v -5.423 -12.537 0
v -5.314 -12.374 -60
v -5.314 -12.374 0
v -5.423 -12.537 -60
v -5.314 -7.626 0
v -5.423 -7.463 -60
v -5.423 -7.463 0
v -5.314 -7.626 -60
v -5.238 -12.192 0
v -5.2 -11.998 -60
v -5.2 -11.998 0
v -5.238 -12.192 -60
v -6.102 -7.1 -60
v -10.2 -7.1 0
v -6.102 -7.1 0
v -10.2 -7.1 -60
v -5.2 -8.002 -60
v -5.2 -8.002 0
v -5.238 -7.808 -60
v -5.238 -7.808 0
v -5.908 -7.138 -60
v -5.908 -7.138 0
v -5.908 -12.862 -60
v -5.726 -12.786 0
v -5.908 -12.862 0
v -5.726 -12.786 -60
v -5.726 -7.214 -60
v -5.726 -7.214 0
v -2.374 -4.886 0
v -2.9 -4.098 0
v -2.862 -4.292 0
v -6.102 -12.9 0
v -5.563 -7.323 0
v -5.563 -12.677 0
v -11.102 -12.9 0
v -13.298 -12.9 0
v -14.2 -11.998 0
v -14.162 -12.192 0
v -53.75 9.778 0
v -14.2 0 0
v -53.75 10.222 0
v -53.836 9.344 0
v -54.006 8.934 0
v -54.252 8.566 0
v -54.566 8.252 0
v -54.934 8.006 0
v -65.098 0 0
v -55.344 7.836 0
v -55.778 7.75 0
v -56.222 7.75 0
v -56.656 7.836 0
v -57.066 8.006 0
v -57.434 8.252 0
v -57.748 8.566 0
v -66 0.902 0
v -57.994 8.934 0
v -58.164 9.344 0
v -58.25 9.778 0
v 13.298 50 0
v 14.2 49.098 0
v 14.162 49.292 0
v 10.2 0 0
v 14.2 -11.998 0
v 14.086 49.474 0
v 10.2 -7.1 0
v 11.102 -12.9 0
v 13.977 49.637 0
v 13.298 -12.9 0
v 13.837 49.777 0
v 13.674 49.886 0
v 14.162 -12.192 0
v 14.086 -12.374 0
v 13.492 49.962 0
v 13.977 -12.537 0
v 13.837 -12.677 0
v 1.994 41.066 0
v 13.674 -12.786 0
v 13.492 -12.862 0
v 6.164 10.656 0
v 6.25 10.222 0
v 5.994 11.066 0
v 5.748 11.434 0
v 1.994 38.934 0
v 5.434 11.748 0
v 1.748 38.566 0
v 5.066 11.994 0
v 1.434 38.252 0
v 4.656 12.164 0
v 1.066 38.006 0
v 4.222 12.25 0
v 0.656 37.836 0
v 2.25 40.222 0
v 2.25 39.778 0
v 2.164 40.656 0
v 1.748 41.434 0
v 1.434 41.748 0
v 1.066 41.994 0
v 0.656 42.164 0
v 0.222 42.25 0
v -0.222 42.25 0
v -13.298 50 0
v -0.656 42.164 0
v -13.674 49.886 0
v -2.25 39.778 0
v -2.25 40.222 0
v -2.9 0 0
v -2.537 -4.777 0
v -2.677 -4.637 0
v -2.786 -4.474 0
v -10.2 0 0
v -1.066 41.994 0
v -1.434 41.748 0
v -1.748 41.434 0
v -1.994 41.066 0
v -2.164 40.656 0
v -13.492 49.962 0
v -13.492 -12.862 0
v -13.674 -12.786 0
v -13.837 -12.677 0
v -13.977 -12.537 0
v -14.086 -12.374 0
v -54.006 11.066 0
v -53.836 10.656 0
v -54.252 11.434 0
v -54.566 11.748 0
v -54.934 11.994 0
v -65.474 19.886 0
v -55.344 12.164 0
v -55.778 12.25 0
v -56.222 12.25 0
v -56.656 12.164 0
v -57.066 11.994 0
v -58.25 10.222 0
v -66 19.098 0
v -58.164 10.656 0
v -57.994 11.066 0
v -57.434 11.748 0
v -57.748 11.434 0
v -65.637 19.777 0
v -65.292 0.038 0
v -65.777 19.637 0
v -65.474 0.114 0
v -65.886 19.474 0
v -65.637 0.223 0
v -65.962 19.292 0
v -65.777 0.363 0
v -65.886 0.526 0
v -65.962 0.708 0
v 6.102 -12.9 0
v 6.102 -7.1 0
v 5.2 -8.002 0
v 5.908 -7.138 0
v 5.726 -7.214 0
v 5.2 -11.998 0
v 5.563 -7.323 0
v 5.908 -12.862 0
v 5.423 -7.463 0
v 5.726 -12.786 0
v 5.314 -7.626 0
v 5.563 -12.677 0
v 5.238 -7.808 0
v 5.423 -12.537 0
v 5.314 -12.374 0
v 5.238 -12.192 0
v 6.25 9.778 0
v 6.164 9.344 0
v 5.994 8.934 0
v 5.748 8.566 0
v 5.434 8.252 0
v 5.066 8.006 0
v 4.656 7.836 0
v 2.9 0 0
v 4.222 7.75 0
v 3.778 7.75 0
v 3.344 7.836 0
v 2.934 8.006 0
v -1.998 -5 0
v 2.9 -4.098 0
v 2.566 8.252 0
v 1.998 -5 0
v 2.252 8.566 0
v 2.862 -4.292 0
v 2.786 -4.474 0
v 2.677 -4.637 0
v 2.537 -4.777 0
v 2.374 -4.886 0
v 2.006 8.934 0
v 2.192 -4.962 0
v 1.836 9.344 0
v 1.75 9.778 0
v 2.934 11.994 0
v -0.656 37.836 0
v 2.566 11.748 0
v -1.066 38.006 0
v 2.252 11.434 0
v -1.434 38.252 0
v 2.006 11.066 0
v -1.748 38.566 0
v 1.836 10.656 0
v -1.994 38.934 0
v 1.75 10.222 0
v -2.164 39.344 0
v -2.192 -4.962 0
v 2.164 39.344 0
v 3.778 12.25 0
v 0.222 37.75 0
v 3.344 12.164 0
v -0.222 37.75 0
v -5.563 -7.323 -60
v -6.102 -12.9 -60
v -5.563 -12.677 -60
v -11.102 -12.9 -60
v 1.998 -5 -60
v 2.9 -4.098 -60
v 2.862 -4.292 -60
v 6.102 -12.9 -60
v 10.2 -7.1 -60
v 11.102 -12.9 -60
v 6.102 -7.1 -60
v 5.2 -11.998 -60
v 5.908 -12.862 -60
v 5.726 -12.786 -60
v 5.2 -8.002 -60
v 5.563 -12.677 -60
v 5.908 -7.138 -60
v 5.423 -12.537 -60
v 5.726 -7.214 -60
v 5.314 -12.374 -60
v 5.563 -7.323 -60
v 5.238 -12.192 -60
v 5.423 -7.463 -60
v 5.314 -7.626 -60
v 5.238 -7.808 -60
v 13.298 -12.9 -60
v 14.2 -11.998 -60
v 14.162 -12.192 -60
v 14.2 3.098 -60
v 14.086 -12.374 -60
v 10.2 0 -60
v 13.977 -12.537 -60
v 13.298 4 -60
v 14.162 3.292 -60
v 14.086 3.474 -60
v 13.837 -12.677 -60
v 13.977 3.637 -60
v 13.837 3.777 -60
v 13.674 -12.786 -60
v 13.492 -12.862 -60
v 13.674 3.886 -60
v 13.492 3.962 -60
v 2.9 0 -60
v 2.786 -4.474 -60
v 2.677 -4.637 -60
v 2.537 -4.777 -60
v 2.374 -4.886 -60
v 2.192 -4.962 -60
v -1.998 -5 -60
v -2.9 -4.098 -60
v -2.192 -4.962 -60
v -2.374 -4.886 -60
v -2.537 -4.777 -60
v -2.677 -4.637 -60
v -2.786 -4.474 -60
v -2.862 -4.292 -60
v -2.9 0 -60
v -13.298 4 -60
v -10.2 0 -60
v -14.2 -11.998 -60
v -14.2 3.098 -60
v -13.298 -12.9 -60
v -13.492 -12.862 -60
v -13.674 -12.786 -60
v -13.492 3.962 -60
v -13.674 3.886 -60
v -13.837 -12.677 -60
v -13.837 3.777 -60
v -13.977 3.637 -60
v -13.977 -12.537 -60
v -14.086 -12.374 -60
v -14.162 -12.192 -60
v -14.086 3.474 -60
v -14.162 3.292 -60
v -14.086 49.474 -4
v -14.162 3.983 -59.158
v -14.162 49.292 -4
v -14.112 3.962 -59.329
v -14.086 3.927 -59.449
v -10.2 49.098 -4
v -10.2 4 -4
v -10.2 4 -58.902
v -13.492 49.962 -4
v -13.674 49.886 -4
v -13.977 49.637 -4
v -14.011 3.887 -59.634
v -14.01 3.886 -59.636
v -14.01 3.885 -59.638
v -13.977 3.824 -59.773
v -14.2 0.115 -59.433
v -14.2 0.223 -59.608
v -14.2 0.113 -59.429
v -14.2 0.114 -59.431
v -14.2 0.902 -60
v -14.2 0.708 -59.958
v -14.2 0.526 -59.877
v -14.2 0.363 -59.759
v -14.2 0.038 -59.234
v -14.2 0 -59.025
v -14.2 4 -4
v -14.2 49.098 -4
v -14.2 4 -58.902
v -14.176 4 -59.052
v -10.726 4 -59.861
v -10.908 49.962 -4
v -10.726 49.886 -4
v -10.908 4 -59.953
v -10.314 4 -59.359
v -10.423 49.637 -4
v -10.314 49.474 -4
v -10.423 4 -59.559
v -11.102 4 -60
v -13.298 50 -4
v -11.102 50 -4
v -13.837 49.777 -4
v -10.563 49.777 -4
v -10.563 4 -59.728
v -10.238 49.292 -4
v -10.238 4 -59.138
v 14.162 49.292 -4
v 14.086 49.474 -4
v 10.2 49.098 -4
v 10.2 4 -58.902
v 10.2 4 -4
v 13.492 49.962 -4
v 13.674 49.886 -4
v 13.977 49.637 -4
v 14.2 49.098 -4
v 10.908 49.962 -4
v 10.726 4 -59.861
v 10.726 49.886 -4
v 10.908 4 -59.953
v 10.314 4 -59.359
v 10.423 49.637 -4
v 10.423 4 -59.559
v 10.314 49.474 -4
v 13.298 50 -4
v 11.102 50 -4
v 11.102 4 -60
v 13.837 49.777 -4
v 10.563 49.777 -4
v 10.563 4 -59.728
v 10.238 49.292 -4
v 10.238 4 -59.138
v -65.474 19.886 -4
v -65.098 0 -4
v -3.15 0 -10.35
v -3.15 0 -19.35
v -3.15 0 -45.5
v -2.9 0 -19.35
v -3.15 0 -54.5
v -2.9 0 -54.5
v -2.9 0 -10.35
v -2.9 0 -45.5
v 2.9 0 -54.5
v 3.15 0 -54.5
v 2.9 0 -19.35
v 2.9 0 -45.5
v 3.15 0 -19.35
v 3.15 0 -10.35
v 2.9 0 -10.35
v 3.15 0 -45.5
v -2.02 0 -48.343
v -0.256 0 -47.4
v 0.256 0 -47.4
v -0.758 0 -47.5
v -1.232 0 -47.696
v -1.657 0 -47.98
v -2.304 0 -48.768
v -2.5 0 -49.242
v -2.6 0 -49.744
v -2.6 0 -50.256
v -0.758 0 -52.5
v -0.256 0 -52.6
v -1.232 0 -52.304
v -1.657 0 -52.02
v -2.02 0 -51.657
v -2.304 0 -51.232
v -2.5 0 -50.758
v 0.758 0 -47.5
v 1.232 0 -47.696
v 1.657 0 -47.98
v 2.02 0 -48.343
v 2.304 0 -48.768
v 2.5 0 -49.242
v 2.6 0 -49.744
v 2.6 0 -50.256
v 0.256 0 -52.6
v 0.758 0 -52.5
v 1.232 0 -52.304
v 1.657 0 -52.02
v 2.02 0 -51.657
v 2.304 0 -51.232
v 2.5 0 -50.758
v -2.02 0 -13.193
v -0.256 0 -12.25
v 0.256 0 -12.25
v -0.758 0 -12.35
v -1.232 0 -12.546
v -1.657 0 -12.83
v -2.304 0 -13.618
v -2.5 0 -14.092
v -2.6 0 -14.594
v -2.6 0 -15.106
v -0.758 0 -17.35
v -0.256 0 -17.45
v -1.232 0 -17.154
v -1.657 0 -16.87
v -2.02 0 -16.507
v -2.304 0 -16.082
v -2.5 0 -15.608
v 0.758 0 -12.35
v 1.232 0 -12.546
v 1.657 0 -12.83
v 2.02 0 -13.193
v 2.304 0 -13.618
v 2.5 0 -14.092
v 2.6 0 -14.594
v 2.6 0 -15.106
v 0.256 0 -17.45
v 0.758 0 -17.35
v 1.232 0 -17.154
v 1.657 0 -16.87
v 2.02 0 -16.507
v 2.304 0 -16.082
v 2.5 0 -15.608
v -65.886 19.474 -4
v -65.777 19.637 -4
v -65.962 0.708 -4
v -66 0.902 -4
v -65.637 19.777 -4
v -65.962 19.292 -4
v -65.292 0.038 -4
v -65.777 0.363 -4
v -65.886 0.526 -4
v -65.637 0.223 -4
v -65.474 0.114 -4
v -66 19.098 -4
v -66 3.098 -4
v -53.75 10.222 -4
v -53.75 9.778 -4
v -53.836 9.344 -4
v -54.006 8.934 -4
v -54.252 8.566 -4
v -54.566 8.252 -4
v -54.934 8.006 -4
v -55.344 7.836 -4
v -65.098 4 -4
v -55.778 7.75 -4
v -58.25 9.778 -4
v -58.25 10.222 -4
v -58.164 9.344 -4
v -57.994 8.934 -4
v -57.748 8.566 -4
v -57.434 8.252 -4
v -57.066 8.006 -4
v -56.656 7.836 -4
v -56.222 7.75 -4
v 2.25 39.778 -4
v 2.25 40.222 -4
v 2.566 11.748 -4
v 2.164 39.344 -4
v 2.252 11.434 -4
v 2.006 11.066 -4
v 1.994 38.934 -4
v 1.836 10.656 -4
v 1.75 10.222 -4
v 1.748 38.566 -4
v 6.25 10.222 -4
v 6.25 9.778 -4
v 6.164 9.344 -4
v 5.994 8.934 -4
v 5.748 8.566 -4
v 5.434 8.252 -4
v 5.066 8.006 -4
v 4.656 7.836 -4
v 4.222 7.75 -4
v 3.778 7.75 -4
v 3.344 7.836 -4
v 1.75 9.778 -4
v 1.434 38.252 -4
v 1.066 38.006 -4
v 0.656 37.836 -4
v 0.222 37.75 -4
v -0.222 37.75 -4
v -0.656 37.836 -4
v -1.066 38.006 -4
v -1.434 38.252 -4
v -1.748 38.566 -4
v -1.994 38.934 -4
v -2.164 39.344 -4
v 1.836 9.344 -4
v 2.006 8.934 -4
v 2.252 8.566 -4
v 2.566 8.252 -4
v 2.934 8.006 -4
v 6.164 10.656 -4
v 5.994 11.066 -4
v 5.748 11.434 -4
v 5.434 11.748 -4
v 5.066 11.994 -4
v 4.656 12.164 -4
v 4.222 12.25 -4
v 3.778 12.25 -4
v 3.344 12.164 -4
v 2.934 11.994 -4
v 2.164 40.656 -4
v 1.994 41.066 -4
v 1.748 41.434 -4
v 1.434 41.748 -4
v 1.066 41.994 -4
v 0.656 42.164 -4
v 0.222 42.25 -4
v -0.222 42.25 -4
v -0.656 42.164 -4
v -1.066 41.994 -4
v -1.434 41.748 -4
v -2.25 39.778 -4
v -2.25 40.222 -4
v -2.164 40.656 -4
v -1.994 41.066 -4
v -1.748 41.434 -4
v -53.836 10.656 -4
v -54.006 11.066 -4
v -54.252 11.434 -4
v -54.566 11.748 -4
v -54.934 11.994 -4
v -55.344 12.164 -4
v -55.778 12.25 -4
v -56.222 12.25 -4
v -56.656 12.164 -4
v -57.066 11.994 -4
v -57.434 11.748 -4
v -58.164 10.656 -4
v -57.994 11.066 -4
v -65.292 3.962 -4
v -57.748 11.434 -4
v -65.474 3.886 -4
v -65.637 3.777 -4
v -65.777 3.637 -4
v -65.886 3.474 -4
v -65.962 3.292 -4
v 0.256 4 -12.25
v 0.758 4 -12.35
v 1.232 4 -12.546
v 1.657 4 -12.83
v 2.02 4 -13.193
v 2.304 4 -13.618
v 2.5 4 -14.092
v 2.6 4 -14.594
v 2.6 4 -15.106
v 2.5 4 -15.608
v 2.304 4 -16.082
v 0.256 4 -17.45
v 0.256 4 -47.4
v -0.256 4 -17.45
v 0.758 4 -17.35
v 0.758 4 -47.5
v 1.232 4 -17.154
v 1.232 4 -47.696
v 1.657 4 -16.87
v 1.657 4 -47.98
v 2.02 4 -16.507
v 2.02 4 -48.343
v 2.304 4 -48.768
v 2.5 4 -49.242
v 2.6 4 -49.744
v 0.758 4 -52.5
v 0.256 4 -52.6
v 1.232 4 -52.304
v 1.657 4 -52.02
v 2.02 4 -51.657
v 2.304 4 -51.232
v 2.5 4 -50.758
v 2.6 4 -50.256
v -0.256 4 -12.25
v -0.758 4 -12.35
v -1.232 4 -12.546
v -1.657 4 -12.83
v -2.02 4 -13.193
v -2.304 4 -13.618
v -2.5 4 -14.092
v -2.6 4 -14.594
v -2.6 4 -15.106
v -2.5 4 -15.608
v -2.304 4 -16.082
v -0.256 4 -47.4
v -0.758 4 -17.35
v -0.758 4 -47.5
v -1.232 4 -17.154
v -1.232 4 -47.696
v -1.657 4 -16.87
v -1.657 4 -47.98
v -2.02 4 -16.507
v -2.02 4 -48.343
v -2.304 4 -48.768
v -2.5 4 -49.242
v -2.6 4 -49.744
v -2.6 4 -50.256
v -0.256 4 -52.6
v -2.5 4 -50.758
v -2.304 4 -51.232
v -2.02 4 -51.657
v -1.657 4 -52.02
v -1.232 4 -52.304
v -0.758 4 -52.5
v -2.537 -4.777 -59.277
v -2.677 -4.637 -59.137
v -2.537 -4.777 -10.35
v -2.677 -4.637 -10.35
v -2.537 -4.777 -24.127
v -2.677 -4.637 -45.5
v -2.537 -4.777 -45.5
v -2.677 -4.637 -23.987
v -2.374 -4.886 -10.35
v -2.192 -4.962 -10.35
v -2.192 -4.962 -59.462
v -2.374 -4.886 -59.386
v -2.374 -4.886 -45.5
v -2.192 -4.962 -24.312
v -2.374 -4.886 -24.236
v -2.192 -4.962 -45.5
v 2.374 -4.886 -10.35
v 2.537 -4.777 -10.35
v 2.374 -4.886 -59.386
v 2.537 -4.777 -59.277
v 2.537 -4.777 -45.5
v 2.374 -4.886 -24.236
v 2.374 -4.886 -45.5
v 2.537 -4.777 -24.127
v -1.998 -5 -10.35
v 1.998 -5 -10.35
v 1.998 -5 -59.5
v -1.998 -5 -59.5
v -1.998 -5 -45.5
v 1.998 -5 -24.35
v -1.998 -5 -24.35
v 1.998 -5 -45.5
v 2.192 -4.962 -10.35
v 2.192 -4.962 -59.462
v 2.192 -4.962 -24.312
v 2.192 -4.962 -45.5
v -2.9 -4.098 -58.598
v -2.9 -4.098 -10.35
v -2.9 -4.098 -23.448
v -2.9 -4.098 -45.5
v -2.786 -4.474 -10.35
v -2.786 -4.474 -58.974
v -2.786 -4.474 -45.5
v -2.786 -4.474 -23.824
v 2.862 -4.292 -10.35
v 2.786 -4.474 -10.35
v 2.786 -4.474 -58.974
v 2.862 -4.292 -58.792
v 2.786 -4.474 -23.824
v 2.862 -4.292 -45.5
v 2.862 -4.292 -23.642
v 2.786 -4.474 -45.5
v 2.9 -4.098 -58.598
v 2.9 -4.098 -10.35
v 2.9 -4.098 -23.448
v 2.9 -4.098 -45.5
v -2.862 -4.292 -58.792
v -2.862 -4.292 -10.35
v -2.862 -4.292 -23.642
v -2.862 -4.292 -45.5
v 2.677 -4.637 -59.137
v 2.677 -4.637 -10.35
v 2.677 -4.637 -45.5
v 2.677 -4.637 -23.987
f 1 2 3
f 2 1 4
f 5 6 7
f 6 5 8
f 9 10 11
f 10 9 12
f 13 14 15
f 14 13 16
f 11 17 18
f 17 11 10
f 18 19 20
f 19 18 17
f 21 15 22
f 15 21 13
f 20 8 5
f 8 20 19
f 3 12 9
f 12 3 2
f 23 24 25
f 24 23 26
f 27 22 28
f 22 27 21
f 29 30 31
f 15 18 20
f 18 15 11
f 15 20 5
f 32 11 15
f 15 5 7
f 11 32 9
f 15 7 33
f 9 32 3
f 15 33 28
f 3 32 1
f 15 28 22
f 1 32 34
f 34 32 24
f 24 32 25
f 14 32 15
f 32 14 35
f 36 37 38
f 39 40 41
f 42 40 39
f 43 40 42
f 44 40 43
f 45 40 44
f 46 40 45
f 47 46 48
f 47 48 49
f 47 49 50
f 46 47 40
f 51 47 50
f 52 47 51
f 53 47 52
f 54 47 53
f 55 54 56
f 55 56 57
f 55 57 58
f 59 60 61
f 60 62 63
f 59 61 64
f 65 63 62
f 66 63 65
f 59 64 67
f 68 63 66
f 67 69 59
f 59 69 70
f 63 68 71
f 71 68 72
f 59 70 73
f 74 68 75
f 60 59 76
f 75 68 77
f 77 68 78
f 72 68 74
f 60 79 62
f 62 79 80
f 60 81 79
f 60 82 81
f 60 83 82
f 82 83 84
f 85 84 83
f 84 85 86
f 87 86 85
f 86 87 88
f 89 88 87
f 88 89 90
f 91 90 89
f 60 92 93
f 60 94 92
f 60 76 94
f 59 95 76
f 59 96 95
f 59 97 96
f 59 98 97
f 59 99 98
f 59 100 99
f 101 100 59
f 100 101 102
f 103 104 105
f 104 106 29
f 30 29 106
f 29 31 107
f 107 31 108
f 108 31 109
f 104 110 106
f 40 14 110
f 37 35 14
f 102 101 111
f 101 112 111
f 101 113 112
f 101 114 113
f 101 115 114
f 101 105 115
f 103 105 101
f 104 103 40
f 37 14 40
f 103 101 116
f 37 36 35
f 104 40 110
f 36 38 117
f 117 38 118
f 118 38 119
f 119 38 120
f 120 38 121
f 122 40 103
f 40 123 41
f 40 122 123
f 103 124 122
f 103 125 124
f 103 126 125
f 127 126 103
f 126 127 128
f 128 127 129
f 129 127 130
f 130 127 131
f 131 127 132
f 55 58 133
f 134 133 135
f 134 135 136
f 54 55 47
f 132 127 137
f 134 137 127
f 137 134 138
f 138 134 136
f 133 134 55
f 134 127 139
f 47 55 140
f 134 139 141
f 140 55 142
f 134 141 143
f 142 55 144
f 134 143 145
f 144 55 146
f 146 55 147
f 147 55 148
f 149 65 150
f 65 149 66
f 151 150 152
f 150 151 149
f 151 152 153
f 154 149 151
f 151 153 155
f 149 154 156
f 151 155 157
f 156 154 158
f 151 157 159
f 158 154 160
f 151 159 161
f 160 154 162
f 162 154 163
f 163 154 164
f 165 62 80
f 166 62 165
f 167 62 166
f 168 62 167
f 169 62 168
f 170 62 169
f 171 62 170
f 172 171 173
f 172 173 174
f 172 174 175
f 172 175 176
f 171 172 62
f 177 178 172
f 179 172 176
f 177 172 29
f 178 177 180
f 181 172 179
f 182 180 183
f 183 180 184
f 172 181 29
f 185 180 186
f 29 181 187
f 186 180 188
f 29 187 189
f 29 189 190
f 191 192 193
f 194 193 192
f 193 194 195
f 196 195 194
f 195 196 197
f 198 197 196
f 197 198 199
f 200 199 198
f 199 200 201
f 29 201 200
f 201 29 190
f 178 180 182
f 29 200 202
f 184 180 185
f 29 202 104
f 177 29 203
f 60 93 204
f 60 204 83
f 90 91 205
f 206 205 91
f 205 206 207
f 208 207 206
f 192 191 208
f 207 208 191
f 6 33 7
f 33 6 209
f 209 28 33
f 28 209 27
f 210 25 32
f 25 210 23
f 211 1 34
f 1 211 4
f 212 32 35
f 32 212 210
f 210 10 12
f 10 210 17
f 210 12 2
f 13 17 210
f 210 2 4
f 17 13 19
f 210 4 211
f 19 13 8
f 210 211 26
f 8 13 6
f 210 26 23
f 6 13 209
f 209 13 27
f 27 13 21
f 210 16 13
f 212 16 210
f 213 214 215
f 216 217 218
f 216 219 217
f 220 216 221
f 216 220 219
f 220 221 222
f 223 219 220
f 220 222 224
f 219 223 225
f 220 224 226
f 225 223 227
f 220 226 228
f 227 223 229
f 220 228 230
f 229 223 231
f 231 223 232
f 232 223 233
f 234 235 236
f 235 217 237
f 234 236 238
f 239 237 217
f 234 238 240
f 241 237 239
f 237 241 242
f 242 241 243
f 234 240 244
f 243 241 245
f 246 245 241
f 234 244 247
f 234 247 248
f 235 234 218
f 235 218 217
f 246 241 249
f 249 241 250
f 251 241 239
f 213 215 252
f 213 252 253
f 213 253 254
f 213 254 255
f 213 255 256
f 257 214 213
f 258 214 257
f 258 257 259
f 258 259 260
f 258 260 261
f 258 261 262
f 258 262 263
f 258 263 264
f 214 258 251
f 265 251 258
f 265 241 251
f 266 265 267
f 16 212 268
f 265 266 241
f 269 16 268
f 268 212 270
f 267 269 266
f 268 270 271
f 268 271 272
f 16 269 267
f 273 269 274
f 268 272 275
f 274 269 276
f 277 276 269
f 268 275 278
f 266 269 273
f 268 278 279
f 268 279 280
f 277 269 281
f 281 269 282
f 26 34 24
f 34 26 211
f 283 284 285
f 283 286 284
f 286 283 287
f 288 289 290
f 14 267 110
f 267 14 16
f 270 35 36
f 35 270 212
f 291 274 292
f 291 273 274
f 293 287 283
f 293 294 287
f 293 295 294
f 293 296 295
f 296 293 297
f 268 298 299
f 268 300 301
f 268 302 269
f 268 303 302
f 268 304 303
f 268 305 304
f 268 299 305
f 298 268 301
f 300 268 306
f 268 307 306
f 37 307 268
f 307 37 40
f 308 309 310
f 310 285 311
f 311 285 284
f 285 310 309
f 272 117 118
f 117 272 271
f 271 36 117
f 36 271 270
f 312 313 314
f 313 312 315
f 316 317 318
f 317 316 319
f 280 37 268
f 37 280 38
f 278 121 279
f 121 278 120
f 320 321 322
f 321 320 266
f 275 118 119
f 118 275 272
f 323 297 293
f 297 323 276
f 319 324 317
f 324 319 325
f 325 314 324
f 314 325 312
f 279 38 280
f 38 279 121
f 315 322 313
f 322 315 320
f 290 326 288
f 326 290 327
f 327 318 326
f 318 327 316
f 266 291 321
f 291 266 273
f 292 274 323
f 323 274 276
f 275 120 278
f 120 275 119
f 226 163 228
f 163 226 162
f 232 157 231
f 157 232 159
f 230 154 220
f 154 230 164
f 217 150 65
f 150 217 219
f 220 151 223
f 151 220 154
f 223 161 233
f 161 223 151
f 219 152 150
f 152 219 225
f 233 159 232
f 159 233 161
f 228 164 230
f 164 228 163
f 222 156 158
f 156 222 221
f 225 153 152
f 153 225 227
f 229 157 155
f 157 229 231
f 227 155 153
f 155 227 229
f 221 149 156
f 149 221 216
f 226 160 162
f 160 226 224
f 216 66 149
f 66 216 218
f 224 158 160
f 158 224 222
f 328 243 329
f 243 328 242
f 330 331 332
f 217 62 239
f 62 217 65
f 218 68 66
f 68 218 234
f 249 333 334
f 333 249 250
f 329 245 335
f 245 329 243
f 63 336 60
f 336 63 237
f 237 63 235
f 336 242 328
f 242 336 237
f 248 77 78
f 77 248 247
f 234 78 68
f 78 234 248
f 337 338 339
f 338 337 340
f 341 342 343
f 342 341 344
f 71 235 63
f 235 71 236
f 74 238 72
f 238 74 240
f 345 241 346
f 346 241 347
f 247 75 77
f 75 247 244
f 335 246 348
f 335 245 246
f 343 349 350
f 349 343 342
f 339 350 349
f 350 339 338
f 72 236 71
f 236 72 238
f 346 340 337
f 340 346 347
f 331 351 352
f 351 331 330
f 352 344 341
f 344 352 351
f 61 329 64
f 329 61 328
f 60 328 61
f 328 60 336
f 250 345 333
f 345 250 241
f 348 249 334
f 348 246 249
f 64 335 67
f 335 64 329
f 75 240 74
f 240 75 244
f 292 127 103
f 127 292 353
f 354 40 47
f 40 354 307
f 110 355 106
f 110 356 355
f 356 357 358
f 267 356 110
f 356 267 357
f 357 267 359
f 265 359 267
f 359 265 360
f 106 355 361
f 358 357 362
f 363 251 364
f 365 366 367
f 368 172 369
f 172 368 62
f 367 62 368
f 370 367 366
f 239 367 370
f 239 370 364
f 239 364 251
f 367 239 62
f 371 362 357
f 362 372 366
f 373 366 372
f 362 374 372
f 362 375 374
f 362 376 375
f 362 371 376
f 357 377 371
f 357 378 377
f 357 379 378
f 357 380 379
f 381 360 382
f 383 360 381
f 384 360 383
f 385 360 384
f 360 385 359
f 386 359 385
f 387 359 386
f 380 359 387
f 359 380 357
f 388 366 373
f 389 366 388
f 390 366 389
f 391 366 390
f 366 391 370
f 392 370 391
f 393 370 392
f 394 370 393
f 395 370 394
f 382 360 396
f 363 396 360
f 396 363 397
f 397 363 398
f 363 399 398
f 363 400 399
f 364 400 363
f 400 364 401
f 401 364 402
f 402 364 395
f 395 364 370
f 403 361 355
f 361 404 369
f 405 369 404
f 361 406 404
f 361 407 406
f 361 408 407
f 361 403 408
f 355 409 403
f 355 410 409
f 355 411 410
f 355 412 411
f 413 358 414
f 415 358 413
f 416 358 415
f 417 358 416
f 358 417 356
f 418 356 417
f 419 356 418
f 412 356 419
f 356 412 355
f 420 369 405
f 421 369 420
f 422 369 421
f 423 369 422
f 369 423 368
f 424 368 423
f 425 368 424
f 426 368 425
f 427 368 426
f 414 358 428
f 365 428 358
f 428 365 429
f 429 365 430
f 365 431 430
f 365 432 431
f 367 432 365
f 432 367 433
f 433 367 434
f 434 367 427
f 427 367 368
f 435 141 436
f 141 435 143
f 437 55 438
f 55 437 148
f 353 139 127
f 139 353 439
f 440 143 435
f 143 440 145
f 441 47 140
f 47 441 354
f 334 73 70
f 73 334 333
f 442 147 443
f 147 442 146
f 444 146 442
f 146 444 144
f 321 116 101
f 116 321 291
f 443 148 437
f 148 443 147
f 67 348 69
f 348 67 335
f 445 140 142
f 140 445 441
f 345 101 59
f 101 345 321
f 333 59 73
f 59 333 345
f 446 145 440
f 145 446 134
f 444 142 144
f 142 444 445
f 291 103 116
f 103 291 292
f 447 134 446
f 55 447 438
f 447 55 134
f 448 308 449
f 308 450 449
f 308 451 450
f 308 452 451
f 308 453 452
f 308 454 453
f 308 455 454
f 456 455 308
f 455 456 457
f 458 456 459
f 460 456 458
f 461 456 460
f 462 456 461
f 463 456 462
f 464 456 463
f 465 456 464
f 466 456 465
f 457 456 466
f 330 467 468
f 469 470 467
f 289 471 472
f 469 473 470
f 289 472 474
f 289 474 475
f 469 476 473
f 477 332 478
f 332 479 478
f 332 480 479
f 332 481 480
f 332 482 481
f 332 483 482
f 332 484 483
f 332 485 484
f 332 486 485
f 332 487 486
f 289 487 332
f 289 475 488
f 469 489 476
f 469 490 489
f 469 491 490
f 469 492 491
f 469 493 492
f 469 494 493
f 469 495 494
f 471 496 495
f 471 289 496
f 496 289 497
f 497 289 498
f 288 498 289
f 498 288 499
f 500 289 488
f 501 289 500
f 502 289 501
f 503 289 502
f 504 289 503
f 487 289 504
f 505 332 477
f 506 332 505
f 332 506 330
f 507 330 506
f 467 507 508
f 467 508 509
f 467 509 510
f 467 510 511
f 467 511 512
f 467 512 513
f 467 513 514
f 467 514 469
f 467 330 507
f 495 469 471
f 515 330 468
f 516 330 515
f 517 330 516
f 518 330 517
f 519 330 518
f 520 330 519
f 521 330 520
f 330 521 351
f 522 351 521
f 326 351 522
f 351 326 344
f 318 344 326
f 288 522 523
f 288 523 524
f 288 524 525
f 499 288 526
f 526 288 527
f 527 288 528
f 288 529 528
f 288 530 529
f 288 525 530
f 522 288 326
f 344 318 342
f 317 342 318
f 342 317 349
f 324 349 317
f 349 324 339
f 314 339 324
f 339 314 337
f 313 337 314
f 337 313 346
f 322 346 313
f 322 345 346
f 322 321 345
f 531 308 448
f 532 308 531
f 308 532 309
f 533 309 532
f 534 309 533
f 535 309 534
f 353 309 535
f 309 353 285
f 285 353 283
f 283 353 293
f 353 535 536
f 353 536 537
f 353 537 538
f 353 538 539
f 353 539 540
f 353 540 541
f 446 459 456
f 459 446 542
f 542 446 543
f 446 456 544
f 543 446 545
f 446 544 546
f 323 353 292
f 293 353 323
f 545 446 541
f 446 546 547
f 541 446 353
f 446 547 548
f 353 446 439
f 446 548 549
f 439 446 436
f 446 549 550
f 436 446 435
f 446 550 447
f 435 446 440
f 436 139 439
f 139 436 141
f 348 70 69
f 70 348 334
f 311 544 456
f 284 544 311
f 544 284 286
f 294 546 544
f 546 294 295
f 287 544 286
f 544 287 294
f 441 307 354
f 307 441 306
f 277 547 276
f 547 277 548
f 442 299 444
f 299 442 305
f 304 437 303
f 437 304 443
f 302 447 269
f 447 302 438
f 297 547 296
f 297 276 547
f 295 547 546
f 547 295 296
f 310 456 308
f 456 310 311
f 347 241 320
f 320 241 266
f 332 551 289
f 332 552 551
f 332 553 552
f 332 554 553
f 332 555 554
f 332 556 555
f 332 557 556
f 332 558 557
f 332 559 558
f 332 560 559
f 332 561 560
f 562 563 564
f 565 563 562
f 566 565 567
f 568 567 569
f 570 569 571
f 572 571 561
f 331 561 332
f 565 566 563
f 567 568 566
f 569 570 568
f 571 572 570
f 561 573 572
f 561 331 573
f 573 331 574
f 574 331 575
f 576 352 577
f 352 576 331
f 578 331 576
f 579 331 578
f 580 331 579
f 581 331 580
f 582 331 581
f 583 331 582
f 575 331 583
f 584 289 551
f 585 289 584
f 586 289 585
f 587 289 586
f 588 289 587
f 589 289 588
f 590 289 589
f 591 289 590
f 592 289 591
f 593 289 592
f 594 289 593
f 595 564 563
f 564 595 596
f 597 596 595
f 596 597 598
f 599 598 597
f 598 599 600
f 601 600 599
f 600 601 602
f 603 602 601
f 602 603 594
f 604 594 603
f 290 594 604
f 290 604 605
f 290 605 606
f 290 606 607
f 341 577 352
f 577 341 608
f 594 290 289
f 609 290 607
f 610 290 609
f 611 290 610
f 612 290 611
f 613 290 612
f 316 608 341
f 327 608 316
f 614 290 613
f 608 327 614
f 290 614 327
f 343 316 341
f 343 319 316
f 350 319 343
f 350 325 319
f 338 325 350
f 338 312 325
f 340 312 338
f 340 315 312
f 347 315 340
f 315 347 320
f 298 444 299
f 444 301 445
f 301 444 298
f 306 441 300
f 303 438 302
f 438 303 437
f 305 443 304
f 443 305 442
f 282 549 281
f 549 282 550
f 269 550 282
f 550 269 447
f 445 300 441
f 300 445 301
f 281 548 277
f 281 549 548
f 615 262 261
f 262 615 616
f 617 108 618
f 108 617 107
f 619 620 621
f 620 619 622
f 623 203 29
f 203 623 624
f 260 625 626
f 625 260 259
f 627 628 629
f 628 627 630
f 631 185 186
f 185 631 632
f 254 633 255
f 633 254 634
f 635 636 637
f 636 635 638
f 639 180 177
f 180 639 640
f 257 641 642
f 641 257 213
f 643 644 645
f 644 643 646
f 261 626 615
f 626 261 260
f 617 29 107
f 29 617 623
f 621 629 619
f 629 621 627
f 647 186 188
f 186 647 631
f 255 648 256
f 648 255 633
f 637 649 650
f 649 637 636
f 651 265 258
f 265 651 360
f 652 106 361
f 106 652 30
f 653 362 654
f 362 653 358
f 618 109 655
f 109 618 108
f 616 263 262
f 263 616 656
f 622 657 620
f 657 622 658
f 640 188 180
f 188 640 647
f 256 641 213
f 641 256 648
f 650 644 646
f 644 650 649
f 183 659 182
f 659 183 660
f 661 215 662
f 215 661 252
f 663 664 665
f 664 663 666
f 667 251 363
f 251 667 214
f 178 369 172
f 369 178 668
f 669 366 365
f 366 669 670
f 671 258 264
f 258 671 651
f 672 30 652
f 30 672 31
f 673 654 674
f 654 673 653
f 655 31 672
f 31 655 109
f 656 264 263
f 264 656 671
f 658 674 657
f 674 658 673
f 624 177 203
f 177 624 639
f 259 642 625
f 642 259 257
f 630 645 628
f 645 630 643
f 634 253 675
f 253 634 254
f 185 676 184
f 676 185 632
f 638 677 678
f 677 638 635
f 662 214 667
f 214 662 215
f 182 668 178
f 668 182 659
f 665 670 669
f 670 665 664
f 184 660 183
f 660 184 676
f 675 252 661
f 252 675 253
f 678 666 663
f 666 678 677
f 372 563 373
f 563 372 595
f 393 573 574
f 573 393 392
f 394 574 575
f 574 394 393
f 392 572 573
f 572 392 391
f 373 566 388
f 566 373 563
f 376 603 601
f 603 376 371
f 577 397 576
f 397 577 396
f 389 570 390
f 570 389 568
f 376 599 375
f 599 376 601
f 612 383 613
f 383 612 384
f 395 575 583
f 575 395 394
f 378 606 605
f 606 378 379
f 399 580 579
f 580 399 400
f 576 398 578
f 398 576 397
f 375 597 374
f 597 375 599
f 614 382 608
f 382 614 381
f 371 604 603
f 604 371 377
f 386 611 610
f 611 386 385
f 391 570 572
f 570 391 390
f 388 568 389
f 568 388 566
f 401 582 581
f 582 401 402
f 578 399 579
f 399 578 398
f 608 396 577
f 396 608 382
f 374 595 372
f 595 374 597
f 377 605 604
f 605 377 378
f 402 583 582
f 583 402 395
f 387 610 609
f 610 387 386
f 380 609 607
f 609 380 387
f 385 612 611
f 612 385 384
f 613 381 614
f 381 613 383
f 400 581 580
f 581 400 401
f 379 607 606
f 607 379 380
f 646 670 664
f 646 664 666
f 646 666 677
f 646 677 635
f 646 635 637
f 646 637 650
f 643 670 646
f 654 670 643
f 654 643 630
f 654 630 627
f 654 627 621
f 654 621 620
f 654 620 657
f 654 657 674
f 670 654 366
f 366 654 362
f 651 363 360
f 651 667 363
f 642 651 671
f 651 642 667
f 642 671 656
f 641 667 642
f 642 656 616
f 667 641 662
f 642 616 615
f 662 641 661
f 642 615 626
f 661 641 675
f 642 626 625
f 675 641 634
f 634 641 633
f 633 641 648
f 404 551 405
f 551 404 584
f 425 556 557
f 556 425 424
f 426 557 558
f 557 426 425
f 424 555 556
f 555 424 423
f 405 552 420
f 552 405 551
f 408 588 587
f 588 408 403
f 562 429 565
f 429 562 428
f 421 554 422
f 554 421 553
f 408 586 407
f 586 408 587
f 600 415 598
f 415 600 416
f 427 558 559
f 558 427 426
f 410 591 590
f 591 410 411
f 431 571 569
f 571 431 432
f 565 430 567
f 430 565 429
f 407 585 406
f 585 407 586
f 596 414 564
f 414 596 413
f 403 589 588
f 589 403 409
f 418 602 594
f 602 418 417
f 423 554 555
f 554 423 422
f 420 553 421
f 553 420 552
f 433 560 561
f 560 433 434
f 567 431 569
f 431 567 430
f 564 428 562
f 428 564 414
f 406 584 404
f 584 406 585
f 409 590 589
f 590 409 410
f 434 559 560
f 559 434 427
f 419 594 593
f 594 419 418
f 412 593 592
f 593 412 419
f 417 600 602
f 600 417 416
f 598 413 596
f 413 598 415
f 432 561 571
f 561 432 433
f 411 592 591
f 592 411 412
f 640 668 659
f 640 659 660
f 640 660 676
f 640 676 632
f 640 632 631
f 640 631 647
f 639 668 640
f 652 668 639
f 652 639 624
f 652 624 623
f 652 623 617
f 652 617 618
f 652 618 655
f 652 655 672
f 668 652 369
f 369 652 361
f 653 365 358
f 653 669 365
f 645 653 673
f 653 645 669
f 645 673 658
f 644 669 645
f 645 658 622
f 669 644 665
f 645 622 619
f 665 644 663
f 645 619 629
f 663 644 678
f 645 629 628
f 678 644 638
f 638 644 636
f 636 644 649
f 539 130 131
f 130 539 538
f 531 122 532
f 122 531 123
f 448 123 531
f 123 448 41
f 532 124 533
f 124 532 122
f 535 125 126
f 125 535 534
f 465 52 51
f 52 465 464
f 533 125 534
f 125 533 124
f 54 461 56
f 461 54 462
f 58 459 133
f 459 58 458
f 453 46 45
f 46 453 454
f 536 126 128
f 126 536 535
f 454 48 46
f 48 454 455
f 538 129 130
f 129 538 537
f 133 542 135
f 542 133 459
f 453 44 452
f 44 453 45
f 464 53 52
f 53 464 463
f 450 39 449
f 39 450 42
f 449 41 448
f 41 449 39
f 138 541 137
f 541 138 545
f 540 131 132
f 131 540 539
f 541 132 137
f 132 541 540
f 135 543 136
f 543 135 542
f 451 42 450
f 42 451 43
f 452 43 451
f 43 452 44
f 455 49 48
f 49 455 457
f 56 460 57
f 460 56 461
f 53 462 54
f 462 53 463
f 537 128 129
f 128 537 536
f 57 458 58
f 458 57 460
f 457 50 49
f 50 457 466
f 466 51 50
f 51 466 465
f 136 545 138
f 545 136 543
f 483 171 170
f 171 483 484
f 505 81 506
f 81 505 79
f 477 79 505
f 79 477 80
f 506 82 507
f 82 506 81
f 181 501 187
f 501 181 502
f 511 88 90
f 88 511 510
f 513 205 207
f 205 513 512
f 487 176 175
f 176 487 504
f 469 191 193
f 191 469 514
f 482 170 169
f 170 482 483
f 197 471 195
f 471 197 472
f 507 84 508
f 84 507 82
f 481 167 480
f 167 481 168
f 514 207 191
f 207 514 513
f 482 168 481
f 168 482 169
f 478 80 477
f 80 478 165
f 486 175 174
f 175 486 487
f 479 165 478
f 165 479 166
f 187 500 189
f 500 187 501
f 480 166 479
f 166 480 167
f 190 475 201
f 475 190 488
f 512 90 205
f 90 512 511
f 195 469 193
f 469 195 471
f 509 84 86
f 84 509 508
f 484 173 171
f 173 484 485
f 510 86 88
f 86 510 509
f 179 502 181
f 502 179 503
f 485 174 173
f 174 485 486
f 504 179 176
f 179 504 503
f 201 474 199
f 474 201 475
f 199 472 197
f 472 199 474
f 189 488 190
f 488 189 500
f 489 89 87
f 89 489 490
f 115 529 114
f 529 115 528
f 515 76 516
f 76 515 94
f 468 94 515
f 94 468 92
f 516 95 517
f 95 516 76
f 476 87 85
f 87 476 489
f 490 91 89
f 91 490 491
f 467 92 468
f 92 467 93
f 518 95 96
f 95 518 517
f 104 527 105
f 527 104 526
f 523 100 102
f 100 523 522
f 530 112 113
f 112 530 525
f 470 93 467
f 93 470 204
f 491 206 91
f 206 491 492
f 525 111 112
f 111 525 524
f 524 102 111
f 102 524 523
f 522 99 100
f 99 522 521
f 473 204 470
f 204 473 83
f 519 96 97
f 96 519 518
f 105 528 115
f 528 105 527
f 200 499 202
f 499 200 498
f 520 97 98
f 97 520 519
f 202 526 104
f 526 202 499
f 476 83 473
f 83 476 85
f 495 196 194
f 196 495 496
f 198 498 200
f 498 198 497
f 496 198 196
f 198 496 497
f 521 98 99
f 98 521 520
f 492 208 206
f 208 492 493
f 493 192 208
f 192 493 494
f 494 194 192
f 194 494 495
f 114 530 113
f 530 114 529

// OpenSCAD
include <lumpyscad/lib.scad>;

tolerance = 0.2;

slot_width = 5.8;
slot_depth = 5;

room_for_t_slot_nut_length = 9;

extrusion_side = 20;
attach_width = 80;
attach_depth = 50;
attach_height = 60;
rounded_diam = 2;

plate_thickness = 4;
wall_thickness = 4;
extrusion_attach_width = extrusion_side + tolerance * 2 + wall_thickness * 2;
extrusion_slot_coverage = extrusion_side / 2 + slot_width / 2;

total_depth = attach_depth + extrusion_side / 2 + slot_width / 2;

width_offset = left * (attach_width / 2 - extrusion_side / 2 - wall_thickness);

plate_screw_diam = 4.5;
plate_screw_head_diam = 9;
plate_screw_head_height = 3;

extrusion_screw_diam = 5.2;
extrusion_screw_head_diam = 9.7;

module main() {
  module position_plate_screws() {
    position_width_brace() {
      for (x = [left, right]) {
        translate([x * (attach_width - extrusion_side) / 2, extrusion_side / 2, 0]) {
          children();
        }
      }
    }
    translate([0, attach_depth - extrusion_side / 2, 0]) {
      children();
    }
  }

  module position_extrusion_screws() {
    translate([0, 0, -attach_height + extrusion_side / 2]) {
      rotate([90, 0, 0]) {
        children();
      }
    }
    translate([0, 0, -plate_thickness - plate_screw_head_height - extrusion_screw_head_diam / 2 - 3]) {
      rotate([90, 0, 0]) {
        children();
      }
    }
  }

  module position_width_brace() {
    translate([width_offset, 0, 0]) {
      children();
    }
  }

  module plate_profile() {
    module body() {
      hull() {
        translate([0, attach_depth / 2, 0]) {
          rounded_square(extrusion_attach_width, attach_depth, rounded_diam);
        }
        position_width_brace() {
          translate([0, extrusion_side / 2, 0]) {
            rounded_square(attach_width, extrusion_side, rounded_diam);
          }
        }
      }
    }

    module holes(){}

    difference() {
      body();
      holes();
    }
  }
  module body() {
    translate([0, 0, -plate_thickness / 2]) {
      linear_extrude(height=plate_thickness, convexity=3, center=true) {
        plate_profile();
      }
    }

    hull() {
      translate([0, wall_thickness / 2, 0]) {
        translate([0, 0, -attach_height / 2]) {
          rounded_cube(extrusion_attach_width, wall_thickness, attach_height, rounded_diam);
        }
        position_width_brace() {
          translate([0, 0, -plate_thickness / 2]) {
            rounded_cube(attach_width, wall_thickness, plate_thickness, rounded_diam);
          }
        }
      }
    }

    // vertical side supports
    for (x = [left, right]) {
      mirror([x - 1, 0, 0]) {
        translate([extrusion_attach_width / 2 - wall_thickness / 2, 0, 0]) {
          translate([-slot_depth / 2 - wall_thickness / 2 + rounded_diam / 2, -extrusion_side / 2, -attach_height / 2]) {
            rounded_cube(slot_depth + rounded_diam, slot_width, attach_height, rounded_diam);
          }
          hull() {
            translate([0, attach_depth - total_depth / 2, -plate_thickness / 2]) {
              rounded_cube(wall_thickness, total_depth, plate_thickness, rounded_diam);
            }
            translate([0, -extrusion_slot_coverage / 2 + wall_thickness / 2, -attach_height / 2]) {
              rounded_cube(wall_thickness, extrusion_slot_coverage + wall_thickness, attach_height, rounded_diam);
            }
          }
        }
      }
    }

    translate([0, -slot_depth / 2 + rounded_diam / 2, -attach_height / 2]) {
      rounded_cube(slot_width, slot_depth + rounded_diam, attach_height, rounded_diam);
    }
  }

  module holes() {
    position_extrusion_screws() {
      hole(5.2, 40, resolution);
      debug_axes(1);
      // clear out the slot filler
      translate([0, 0, slot_depth / 2 + tolerance / 2]) {
        hull() {
          cube([slot_width + 0.5, room_for_t_slot_nut_length, slot_depth + tolerance], center=true);

          translate([0, -slot_depth, slot_depth]) {
            cube([slot_width + 0.5, room_for_t_slot_nut_length, slot_depth + tolerance], center=true);
          }
        }
      }
    }

    position_plate_screws() {
      hole(plate_screw_diam, 40, resolution);
      translate([0, 0, -plate_thickness - 2]) {
        %hole(plate_screw_head_diam, 2, resolution);
      }
    }
  }

  difference() {
    body();
    holes();
  }
}

main();
